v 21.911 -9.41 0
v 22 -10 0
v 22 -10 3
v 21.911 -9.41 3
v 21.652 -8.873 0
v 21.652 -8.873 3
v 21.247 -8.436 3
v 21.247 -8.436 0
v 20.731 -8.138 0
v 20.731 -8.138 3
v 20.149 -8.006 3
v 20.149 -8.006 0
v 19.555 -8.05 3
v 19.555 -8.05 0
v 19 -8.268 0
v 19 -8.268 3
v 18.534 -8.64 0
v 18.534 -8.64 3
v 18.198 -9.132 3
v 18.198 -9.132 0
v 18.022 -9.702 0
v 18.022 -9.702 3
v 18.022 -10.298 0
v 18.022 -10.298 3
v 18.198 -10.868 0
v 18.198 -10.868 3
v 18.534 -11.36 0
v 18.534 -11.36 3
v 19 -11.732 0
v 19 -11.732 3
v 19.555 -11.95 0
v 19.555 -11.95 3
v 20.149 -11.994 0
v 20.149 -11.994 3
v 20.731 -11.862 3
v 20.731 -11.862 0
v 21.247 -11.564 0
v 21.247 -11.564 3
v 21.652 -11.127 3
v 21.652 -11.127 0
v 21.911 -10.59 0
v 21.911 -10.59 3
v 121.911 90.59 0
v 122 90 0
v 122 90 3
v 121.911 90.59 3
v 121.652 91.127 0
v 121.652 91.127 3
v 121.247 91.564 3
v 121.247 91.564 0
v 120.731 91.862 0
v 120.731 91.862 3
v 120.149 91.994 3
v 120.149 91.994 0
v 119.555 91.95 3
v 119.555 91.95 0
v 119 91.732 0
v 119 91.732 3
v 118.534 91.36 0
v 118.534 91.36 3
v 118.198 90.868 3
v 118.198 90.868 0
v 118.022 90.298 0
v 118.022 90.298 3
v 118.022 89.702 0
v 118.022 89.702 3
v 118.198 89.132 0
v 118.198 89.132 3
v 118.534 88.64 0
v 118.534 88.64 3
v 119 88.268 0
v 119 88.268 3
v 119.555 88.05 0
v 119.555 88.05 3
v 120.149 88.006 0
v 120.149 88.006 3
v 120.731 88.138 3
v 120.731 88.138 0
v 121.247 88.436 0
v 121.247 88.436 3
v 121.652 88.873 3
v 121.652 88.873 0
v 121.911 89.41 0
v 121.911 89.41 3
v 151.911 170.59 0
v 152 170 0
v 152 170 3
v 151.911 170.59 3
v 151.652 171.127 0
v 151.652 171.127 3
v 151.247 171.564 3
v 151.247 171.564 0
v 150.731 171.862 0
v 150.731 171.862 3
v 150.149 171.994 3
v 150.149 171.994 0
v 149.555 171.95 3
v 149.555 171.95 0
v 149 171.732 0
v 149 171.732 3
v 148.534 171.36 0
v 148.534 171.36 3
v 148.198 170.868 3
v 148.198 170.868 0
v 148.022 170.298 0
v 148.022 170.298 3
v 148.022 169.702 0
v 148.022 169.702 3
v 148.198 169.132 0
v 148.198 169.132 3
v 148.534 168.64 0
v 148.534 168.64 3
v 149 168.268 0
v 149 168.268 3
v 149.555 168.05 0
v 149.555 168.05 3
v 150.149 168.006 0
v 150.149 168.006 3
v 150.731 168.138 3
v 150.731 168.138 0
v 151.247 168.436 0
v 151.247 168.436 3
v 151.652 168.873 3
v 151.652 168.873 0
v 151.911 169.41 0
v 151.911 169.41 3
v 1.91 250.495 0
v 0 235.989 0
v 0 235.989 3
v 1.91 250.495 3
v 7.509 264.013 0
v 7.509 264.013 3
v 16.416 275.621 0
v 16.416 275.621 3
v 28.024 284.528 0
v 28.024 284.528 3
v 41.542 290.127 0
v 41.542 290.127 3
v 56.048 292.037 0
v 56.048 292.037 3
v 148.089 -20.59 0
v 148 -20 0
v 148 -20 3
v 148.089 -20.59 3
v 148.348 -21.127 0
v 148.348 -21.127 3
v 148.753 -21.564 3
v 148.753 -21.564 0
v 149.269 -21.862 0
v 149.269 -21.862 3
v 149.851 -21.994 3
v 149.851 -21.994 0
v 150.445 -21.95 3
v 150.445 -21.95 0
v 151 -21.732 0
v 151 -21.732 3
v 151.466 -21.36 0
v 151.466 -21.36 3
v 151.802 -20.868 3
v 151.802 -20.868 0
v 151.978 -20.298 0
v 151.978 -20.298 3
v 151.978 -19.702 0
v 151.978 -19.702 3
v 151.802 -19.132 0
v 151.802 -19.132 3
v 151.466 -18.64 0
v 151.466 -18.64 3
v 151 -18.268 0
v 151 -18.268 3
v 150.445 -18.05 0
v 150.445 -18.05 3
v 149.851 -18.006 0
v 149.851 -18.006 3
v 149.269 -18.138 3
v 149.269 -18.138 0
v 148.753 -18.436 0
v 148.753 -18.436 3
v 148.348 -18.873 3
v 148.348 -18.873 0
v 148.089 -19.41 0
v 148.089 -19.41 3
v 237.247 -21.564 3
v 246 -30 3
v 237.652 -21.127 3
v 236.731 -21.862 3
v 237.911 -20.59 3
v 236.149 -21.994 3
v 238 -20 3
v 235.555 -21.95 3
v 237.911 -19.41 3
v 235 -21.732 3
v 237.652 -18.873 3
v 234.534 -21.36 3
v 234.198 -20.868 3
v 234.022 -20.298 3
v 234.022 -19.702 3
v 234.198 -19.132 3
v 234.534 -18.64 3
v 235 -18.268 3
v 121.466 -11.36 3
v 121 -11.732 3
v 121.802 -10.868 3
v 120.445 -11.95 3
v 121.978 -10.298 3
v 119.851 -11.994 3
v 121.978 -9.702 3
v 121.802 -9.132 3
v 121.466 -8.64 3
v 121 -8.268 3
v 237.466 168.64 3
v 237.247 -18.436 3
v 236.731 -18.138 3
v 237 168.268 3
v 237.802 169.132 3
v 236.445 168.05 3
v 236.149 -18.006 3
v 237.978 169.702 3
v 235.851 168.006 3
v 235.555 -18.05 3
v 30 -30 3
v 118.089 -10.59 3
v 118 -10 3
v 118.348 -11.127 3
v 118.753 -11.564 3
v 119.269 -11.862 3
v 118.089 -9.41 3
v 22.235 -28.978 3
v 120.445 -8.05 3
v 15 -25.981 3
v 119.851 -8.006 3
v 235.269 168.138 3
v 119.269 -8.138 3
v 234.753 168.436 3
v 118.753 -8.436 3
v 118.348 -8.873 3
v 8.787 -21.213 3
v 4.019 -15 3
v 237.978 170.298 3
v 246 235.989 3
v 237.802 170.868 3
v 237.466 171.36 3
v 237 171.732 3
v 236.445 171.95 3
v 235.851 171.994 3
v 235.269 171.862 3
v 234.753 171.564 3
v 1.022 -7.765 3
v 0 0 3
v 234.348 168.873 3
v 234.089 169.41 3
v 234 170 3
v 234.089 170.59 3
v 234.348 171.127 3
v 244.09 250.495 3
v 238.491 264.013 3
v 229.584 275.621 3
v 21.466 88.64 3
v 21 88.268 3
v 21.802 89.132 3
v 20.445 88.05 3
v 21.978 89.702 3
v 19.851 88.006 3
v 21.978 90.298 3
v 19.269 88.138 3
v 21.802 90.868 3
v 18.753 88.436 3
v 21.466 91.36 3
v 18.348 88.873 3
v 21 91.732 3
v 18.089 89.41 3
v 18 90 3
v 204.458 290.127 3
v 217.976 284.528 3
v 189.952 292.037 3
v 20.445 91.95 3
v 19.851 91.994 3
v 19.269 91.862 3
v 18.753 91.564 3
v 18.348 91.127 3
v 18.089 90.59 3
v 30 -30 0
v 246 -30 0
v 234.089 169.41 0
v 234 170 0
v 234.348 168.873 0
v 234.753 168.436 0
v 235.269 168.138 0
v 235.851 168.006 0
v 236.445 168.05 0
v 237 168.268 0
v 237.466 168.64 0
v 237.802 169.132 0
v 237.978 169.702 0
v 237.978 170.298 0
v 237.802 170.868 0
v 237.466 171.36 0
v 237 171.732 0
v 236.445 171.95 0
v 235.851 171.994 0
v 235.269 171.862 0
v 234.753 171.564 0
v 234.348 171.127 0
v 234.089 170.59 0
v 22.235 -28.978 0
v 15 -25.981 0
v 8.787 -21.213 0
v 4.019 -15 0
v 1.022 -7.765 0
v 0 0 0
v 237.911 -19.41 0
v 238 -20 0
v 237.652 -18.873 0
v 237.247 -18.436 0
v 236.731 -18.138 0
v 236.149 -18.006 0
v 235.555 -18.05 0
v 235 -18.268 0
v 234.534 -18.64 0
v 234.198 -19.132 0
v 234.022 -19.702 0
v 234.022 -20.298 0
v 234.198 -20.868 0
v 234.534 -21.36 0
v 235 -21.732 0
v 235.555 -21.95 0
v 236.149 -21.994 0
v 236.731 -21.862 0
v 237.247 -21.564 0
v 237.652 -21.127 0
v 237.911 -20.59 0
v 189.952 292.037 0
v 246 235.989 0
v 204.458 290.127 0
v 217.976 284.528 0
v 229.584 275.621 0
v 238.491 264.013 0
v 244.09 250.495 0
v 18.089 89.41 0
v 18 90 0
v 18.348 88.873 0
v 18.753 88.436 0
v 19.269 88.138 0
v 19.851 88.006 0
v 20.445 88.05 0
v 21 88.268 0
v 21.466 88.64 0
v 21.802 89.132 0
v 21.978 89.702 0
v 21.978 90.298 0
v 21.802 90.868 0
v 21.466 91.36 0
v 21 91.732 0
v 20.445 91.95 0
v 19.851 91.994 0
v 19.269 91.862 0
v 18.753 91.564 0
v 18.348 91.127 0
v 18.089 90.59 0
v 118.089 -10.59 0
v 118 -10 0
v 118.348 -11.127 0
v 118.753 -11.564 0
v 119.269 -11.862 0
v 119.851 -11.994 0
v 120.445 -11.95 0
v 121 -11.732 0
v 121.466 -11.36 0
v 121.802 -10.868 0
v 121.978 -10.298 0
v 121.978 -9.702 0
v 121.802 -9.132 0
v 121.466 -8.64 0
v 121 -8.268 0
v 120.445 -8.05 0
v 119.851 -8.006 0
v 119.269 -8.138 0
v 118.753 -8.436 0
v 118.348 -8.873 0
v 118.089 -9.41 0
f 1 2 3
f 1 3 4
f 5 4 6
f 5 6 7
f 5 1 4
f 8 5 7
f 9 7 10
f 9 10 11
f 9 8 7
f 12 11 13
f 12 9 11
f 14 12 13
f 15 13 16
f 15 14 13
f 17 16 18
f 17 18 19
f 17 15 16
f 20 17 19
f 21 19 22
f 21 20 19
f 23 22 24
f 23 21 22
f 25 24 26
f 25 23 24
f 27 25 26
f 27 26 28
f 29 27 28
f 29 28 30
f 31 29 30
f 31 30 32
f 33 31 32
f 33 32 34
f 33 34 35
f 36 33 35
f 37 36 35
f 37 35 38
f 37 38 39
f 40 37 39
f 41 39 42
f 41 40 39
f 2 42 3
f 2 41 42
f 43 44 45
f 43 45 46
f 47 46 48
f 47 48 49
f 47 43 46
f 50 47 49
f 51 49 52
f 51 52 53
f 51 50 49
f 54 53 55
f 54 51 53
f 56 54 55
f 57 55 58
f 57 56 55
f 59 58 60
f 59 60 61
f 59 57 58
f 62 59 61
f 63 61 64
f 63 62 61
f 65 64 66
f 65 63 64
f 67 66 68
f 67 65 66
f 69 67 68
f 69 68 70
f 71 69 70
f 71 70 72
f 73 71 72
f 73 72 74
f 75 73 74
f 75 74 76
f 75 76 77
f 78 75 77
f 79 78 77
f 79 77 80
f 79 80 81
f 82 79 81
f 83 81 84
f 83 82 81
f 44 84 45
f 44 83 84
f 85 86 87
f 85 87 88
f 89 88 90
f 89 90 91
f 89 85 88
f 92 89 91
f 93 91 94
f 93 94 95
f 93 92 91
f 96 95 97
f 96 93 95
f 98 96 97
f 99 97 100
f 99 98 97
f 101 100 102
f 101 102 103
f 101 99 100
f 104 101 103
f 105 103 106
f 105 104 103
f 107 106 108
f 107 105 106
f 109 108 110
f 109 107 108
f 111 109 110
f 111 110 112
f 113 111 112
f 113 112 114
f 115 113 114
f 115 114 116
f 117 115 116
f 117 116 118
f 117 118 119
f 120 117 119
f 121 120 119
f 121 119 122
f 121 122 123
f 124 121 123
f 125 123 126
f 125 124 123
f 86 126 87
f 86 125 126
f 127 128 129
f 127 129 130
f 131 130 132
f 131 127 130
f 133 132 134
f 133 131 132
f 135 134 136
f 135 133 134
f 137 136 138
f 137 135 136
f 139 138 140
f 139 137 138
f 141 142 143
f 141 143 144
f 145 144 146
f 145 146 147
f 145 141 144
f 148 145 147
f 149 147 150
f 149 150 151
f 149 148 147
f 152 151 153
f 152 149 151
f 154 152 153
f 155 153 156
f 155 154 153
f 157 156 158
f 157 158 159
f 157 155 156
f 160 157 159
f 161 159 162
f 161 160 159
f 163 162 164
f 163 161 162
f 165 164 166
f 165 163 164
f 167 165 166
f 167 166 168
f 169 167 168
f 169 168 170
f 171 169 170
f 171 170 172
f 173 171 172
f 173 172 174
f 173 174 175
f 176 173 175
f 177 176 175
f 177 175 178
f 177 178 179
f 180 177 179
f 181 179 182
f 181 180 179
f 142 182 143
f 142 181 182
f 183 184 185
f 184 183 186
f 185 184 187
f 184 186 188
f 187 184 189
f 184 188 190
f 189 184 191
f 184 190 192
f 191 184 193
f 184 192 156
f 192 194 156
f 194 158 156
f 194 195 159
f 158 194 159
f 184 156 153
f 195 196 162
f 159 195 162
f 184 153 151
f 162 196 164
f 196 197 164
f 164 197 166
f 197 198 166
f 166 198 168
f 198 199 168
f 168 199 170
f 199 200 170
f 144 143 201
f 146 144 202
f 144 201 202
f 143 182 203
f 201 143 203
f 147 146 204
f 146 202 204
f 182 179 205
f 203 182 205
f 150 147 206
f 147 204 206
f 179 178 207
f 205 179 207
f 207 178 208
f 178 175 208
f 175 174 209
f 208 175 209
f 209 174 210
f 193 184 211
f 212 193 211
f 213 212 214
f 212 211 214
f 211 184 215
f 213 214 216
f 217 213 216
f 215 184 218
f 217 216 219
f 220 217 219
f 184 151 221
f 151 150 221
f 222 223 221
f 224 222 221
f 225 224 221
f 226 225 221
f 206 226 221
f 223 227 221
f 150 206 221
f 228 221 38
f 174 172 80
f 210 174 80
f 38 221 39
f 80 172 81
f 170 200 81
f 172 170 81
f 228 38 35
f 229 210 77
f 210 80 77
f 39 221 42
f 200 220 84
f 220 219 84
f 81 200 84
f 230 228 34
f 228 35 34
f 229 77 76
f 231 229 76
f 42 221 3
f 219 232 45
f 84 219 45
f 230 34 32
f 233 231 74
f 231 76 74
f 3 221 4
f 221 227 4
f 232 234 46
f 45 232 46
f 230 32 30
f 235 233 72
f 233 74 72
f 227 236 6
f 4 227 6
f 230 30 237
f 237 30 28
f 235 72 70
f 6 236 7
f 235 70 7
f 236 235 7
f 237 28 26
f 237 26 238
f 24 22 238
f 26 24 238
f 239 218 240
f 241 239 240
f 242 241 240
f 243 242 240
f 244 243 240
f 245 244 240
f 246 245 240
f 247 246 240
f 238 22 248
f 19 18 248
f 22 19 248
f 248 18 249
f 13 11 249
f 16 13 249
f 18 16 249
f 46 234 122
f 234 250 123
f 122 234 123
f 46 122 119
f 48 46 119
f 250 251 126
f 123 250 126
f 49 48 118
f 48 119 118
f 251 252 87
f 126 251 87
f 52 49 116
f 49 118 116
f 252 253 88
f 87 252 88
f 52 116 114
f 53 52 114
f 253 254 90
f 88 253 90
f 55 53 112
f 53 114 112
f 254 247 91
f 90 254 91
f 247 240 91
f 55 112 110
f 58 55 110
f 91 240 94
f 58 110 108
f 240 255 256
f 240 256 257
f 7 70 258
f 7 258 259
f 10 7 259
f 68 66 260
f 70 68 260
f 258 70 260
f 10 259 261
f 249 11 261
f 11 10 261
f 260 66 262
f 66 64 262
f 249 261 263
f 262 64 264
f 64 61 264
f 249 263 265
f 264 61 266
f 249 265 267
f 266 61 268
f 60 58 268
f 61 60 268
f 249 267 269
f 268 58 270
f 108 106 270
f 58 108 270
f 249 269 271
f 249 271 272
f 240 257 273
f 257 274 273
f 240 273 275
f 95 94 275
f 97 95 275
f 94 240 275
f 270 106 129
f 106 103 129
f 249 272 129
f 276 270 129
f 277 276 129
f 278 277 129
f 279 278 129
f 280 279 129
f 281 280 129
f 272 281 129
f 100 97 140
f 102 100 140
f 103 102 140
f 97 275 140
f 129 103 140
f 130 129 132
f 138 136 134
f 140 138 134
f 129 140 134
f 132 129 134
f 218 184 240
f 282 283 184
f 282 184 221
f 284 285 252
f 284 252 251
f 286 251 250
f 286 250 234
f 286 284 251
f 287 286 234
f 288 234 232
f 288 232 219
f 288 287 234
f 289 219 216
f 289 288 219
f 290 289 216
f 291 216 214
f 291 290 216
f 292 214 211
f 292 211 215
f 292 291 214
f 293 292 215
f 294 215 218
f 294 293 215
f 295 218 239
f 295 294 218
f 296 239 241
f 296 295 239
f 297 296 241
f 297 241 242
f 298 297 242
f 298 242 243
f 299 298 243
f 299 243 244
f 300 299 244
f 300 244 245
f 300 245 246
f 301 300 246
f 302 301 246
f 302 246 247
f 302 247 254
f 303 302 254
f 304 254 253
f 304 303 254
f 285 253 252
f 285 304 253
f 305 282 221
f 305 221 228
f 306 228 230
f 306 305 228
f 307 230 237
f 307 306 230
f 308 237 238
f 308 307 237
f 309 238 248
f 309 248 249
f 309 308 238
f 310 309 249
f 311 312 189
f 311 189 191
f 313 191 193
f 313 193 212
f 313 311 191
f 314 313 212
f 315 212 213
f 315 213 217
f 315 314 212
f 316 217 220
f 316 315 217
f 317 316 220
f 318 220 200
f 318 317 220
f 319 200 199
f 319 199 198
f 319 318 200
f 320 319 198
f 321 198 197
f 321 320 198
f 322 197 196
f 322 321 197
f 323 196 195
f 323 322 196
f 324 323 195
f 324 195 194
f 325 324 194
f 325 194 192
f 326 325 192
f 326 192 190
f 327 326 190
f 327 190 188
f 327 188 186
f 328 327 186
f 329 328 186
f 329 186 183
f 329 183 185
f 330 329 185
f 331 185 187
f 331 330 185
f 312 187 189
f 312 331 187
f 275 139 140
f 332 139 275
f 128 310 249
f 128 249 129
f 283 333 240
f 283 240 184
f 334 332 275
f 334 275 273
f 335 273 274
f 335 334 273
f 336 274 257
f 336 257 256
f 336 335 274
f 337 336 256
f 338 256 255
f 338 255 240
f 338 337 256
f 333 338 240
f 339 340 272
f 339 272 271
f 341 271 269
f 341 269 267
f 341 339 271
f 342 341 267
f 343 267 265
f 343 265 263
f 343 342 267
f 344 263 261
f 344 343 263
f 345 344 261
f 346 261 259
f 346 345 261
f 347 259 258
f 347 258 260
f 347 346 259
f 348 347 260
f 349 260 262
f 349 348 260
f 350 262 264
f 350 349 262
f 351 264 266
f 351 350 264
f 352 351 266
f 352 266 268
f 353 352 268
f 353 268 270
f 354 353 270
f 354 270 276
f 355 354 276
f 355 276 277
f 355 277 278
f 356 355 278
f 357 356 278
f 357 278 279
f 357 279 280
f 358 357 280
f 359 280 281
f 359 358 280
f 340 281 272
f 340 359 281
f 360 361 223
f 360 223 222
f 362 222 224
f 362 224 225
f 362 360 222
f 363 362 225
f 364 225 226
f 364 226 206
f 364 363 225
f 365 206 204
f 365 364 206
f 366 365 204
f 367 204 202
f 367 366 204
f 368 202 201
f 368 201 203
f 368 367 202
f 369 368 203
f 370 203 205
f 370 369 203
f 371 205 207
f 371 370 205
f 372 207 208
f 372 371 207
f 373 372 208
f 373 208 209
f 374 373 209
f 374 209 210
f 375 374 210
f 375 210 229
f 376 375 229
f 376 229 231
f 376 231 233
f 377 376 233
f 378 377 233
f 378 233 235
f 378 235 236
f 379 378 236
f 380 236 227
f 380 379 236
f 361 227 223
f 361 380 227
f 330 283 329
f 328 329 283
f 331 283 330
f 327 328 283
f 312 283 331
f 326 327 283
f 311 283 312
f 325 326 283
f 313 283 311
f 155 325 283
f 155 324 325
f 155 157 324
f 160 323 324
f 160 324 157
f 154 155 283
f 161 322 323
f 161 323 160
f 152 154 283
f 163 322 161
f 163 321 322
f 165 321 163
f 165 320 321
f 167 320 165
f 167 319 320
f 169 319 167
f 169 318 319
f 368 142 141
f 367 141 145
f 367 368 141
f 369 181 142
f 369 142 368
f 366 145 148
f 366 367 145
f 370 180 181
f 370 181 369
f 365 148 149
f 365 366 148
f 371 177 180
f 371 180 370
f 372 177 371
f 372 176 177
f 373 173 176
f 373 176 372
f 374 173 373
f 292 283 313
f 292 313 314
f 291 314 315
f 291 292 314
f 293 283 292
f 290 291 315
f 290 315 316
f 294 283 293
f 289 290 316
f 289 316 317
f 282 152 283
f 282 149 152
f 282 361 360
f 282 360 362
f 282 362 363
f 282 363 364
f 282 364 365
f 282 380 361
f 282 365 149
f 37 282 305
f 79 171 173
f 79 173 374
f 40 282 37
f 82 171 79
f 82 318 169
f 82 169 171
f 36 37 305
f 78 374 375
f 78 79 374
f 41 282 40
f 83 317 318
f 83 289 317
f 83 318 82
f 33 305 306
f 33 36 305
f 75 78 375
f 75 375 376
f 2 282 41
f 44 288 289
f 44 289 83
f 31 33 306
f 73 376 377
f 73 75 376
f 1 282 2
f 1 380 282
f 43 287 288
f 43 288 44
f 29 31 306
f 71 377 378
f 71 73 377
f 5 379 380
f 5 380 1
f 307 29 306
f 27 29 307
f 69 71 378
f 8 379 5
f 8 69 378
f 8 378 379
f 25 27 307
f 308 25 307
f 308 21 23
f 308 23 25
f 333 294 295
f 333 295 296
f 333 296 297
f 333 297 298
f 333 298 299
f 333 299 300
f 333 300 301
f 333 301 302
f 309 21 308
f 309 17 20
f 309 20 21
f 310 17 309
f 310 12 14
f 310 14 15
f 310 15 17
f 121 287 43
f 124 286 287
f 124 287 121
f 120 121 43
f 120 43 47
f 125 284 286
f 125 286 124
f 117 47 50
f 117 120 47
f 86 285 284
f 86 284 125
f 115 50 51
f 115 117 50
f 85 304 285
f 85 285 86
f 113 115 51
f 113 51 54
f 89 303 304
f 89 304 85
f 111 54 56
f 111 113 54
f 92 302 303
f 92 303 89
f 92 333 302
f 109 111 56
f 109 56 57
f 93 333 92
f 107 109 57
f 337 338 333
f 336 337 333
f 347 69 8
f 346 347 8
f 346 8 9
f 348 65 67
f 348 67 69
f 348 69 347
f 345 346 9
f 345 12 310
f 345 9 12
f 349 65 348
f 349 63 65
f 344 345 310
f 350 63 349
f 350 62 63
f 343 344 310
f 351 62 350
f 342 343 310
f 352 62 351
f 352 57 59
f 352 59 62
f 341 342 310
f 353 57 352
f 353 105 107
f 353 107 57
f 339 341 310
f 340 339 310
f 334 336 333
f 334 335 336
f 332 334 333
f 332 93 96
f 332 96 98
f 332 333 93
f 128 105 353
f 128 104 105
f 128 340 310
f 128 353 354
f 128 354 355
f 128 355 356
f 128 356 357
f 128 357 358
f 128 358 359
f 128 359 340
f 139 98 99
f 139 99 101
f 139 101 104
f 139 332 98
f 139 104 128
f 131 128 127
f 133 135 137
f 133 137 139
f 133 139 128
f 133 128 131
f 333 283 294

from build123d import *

# Parameters (mm, degrees)
CROQUIS2_R              = 2
SALIENTE_EXTRUIR2_DEPTH = 3


with BuildPart() as part:
    # Croquis2 → Saliente-Extruir2 (new body)
    with BuildSketch(Plane.XY):
        with BuildLine():
            Line((0, 0), (0, 80))
            Line((0, 80), (0, 235.988905846))
            ThreePointArc((0, 235.988905846), (16.416079704, 275.620828109), (56.048001966, 292.036907812))
            Line((56.048001966, 292.036907812), (189.951998034, 292.036907812))
            ThreePointArc((189.951998034, 292.036907812), (229.583920296, 275.620828109), (246, 235.988905846))
            Line((246, 235.988905846), (246, 180))
            Line((246, 180), (246, -30))
            Line((246, -30), (140, -30))
            Line((140, -30), (110, -30))
            Line((110, -30), (30, -30))
            ThreePointArc((30, -30), (8.786796564, -21.213203436), (0, 0))
        make_face()
        with Locations((20, -10)):
            Circle(CROQUIS2_R, mode=Mode.SUBTRACT)
        with Locations(Location((120, -10, 0), (0, 0, 180))):
            Circle(CROQUIS2_R, mode=Mode.SUBTRACT)
        with Locations((120, 90)):
            Circle(CROQUIS2_R, mode=Mode.SUBTRACT)
        with Locations(Location((20, 90, 0), (0, 0, 180))):
            Circle(CROQUIS2_R, mode=Mode.SUBTRACT)
        with Locations((150, 170)):
            Circle(CROQUIS2_R, mode=Mode.SUBTRACT)
        with Locations(Location((236, 170, 0), (0, 0, 180))):
            Circle(CROQUIS2_R, mode=Mode.SUBTRACT)
        with Locations((236, -20)):
            Circle(CROQUIS2_R, mode=Mode.SUBTRACT)
        with Locations(Location((150, -20, 0), (0, 0, 180))):
            Circle(CROQUIS2_R, mode=Mode.SUBTRACT)
    extrude(amount=SALIENTE_EXTRUIR2_DEPTH)


solid = part.part
